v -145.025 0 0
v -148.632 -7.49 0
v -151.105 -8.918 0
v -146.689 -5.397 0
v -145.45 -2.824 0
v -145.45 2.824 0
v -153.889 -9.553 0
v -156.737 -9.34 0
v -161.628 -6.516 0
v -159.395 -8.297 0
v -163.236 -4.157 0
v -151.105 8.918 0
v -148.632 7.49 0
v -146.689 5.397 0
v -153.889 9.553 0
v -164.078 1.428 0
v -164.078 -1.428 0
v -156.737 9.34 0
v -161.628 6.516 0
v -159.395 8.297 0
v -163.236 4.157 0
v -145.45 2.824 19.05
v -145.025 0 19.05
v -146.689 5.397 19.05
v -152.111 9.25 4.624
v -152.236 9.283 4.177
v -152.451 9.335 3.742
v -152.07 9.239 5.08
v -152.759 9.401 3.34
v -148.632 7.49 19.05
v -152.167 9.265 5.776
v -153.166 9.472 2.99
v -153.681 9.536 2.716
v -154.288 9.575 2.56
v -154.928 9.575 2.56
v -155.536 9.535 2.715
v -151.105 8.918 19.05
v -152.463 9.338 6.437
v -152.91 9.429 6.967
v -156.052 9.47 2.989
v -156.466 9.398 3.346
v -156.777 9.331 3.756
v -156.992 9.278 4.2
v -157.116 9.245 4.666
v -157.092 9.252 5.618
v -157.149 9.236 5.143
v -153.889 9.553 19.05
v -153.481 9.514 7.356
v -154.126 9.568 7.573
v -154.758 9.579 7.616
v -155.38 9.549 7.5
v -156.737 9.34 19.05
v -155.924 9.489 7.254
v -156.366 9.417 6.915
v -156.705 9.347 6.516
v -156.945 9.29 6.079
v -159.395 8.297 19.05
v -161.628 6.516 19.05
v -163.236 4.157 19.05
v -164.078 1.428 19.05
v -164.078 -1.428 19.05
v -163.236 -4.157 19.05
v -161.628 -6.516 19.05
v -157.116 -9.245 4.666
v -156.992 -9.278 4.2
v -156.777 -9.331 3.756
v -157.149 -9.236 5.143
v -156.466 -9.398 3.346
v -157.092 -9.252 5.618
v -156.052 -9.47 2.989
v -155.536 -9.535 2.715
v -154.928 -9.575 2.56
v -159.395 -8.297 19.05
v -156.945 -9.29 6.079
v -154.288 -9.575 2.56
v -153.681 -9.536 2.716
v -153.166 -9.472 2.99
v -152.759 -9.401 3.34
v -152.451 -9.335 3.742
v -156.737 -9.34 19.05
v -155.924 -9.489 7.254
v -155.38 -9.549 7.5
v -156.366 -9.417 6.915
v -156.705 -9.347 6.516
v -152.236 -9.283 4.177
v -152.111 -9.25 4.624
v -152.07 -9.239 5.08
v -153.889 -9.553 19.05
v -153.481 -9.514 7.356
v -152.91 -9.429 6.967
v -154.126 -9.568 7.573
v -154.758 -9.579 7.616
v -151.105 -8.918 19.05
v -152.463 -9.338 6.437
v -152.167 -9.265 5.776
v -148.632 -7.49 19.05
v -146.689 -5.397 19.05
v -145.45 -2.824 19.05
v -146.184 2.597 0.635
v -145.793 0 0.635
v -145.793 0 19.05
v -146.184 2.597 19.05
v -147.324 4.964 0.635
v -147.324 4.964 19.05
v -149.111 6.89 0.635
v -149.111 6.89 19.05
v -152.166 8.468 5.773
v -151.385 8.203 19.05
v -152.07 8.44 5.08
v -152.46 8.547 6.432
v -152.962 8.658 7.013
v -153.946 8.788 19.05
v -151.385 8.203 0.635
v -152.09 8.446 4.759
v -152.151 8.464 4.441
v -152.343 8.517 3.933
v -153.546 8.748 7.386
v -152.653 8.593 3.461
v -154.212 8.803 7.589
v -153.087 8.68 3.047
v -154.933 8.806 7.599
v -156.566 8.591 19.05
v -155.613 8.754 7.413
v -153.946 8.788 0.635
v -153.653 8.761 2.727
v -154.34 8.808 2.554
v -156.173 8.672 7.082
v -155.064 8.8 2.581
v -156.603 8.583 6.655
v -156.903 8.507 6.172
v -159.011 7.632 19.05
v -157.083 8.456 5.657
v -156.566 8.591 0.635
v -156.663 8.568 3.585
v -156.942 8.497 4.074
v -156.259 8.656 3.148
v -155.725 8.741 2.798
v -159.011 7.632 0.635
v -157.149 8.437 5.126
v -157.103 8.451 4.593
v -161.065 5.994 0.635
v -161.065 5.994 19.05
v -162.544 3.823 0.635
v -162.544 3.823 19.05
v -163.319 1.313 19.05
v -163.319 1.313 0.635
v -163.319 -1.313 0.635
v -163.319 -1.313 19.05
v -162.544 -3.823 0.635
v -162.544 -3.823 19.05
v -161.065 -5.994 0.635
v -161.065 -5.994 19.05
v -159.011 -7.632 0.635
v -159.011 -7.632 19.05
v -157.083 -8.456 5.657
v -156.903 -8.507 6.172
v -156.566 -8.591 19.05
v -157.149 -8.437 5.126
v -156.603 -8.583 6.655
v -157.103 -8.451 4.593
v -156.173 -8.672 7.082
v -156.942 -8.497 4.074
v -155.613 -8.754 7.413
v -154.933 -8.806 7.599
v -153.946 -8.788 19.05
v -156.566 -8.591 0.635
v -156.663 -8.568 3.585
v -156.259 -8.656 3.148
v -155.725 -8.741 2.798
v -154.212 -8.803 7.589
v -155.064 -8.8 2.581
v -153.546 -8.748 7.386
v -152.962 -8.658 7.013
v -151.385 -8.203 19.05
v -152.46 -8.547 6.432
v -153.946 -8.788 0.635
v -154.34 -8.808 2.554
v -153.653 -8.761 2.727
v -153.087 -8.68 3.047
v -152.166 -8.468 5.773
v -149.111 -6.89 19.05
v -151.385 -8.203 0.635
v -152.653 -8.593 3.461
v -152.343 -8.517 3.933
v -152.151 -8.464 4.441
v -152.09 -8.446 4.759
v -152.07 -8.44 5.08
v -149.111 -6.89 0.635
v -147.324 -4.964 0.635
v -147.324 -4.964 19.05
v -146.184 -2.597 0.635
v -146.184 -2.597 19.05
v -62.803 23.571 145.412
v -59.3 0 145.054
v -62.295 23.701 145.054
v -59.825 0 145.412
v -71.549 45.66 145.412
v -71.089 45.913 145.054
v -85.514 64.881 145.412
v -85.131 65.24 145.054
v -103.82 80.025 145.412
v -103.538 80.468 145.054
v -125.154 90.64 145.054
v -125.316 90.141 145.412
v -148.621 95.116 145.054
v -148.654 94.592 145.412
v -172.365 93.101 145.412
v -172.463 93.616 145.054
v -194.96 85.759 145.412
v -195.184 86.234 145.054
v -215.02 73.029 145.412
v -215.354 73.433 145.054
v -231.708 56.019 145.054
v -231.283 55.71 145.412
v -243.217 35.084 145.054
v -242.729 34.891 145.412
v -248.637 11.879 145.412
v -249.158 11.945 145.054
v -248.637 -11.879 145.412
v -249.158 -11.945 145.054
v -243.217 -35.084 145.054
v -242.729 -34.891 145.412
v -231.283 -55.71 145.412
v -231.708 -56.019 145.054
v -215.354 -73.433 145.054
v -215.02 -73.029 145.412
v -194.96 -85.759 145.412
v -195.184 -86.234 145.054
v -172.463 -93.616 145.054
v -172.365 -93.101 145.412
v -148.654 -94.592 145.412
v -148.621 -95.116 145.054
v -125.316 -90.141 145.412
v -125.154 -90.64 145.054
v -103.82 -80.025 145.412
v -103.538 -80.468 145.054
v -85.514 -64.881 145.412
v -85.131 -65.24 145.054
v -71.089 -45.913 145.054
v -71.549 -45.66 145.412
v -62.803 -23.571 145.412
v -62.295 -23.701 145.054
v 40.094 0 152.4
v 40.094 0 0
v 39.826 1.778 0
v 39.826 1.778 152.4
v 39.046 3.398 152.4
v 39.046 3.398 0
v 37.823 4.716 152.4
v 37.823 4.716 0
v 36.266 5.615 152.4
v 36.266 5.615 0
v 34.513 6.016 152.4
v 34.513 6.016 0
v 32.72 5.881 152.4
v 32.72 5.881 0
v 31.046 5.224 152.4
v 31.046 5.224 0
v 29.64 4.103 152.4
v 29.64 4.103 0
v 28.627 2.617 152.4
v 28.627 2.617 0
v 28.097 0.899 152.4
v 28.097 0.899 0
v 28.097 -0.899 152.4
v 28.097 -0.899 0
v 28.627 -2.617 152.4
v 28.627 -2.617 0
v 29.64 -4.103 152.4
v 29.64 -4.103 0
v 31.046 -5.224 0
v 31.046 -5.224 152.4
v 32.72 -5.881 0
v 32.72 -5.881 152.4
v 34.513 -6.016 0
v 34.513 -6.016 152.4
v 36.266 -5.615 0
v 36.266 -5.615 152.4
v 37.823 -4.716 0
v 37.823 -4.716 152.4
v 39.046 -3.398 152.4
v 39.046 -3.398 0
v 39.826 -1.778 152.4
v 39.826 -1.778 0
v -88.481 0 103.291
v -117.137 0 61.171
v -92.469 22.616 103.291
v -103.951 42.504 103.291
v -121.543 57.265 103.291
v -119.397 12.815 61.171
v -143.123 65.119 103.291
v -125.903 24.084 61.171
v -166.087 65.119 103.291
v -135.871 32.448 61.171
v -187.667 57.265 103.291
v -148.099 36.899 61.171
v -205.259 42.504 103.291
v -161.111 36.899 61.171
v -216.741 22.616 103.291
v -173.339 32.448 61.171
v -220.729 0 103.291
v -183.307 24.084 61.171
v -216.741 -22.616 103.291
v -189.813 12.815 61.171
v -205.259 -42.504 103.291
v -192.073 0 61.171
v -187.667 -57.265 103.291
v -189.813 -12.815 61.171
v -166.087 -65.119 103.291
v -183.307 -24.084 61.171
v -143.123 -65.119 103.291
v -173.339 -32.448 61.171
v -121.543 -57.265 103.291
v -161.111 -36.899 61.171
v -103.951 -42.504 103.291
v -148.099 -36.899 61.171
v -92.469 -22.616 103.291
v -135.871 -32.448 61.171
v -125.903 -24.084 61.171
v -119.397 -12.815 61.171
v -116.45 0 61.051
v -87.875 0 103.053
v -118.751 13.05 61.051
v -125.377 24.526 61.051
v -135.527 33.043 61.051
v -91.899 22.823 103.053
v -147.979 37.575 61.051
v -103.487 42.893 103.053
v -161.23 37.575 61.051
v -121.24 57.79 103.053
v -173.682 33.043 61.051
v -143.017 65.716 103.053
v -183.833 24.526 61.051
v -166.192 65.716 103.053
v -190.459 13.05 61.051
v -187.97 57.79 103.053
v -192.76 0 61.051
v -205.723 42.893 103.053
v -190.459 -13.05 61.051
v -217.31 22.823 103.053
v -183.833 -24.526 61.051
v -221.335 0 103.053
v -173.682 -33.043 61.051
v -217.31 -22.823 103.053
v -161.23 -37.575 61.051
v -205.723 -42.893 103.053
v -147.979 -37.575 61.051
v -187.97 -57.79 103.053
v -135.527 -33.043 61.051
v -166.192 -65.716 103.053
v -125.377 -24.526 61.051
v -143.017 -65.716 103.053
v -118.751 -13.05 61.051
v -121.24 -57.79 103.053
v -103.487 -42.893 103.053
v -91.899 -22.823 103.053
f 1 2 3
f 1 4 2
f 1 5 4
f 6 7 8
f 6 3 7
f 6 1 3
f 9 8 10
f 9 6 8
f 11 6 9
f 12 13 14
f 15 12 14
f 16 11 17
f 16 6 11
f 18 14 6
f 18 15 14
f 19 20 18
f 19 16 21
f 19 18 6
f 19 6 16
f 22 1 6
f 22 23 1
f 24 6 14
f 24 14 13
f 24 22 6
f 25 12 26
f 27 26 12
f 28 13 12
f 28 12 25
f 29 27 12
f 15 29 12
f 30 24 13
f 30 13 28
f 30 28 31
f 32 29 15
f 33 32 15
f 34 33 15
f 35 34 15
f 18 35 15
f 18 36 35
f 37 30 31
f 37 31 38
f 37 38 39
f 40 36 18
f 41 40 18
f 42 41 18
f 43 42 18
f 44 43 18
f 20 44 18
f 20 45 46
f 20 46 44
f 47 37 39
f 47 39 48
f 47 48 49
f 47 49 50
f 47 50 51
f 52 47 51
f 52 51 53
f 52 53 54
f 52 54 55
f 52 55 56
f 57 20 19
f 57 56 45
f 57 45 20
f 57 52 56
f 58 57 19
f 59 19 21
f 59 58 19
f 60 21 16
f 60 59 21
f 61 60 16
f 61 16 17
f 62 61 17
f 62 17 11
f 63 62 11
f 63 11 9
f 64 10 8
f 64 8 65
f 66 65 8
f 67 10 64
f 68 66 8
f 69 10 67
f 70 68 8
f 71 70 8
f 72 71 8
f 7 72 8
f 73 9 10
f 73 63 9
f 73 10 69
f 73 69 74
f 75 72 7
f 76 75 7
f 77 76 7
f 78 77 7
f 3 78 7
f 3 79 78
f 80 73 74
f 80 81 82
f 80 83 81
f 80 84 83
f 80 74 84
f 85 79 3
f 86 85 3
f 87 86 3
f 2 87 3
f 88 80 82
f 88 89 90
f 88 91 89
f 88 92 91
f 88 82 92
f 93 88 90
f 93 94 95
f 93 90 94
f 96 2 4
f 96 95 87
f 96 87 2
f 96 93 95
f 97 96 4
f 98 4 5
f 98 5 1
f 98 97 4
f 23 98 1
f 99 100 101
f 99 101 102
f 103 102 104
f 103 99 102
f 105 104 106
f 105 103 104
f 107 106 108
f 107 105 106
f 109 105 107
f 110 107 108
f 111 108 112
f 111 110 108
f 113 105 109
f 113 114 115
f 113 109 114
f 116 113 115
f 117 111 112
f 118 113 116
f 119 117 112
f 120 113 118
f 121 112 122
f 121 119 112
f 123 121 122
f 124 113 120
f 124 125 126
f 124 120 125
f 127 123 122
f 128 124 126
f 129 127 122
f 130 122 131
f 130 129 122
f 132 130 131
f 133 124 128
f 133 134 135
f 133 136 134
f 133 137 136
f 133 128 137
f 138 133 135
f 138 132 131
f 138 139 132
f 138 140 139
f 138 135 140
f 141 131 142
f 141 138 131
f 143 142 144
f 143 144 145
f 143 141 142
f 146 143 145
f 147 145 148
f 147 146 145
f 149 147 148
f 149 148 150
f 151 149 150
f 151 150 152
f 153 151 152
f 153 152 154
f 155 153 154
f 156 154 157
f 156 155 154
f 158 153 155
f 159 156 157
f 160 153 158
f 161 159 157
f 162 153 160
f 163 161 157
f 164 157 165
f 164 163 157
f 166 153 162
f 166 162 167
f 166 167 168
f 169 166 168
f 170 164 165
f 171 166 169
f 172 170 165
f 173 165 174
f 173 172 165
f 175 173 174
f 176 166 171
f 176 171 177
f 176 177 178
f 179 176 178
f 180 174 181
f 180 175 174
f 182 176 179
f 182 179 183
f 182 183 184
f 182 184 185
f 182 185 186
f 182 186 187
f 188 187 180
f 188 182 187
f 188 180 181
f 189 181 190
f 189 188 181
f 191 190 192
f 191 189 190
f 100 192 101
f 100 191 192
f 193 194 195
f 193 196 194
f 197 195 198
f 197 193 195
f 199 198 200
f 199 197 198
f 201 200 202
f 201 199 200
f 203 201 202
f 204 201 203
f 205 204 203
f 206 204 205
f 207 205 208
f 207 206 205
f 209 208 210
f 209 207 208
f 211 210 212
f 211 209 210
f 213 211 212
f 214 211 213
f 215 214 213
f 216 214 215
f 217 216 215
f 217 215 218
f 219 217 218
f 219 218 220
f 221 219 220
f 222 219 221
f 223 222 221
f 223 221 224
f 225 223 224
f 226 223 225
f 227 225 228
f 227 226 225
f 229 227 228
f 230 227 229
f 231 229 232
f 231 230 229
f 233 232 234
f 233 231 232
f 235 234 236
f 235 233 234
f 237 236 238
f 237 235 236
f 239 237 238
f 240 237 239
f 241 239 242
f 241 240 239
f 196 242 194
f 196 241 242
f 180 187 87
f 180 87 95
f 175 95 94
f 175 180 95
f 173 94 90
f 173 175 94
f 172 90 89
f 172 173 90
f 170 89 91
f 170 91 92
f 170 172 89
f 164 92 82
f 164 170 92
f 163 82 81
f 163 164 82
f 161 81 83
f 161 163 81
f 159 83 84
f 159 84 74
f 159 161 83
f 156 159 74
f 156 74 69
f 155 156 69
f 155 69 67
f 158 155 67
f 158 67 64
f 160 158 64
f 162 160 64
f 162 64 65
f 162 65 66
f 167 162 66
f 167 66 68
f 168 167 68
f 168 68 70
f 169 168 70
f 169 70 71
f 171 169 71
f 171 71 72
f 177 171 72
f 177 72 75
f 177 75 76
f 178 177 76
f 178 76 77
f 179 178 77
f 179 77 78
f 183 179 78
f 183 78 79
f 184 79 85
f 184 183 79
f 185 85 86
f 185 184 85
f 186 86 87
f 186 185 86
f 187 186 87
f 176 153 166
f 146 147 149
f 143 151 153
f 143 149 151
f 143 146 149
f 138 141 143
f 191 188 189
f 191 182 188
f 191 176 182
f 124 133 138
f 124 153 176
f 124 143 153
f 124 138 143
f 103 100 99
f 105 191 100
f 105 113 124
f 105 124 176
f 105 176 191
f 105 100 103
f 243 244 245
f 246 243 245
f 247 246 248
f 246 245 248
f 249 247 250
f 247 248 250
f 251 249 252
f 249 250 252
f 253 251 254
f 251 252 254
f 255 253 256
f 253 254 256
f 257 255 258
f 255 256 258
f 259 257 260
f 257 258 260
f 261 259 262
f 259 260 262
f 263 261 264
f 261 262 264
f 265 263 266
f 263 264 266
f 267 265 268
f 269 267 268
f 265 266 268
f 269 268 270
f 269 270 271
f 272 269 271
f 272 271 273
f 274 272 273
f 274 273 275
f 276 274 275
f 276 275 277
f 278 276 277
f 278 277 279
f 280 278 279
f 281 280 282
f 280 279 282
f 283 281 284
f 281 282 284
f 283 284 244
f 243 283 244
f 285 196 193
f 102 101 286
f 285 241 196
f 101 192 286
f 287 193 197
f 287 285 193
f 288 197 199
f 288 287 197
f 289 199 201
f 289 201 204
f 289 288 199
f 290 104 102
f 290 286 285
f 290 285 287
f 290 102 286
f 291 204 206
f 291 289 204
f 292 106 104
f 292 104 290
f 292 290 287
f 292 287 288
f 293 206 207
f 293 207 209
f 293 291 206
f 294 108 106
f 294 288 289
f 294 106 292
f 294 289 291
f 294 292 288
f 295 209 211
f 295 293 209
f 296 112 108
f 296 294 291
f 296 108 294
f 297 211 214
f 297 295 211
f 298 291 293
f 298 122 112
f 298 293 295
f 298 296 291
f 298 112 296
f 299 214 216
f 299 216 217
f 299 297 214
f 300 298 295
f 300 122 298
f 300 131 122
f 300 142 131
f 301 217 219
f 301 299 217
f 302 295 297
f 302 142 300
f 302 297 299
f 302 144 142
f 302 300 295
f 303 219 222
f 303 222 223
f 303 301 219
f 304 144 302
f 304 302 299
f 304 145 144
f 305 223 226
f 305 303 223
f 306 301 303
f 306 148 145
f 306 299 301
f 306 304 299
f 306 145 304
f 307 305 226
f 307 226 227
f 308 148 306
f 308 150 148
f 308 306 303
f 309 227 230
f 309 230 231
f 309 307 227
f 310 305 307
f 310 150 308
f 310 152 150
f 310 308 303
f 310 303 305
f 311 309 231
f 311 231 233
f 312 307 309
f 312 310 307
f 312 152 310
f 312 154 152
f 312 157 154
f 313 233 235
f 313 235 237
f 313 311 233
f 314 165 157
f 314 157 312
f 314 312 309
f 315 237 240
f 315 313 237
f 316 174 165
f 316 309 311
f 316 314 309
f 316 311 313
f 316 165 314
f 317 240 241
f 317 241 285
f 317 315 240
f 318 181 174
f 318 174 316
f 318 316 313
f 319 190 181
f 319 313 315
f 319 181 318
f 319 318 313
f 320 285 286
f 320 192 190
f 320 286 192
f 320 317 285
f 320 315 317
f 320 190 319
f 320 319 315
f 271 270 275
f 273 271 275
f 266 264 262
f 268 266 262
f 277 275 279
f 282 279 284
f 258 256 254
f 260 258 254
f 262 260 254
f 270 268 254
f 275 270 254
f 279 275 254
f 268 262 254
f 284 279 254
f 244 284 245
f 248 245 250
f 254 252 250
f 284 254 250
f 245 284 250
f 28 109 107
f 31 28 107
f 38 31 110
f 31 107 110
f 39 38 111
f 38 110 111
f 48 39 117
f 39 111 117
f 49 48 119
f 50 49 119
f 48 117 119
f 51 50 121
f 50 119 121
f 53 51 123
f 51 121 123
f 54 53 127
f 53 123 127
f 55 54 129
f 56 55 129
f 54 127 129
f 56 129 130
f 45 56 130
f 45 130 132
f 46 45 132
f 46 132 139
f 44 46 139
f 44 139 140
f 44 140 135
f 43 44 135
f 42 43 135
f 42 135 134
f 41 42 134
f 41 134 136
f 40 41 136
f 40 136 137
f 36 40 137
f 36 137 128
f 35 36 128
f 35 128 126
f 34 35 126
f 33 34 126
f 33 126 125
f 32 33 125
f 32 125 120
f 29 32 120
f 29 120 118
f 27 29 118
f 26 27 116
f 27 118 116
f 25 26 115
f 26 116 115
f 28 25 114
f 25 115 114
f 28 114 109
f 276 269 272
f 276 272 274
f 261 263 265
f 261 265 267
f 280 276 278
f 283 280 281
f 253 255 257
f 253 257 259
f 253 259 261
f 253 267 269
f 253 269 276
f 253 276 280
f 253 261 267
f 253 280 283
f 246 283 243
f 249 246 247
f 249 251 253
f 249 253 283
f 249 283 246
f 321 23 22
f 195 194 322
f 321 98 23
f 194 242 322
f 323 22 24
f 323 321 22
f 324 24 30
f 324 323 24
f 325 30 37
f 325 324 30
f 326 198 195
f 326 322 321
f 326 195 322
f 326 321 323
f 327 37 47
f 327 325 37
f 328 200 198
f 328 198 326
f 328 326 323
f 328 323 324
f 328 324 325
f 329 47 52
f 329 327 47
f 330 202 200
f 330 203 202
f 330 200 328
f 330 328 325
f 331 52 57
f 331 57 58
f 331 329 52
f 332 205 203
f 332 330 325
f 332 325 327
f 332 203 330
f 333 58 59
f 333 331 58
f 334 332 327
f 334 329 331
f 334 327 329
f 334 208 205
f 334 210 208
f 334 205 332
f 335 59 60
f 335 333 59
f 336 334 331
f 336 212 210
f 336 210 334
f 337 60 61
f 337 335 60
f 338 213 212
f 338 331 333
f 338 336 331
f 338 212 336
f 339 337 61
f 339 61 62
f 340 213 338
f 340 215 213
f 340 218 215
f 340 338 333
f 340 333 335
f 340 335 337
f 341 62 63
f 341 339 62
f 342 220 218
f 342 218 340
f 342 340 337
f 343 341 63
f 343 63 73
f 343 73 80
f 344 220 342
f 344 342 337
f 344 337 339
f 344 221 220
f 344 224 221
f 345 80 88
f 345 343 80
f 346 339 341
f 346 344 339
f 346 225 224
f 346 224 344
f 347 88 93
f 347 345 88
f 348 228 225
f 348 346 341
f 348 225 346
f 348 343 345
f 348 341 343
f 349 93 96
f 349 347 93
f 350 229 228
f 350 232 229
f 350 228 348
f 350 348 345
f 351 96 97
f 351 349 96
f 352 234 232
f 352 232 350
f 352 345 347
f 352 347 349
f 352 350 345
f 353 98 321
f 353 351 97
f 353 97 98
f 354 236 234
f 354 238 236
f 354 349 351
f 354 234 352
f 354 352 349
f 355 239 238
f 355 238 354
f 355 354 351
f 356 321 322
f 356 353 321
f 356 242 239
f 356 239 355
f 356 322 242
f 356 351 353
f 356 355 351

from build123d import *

# Parameters (mm, degrees)
F0_R           = 6.35
F1_DEPTH       = 0.635
F2_R           = 6.35
F2_R_2         = 5.715
F3_DEPTH       = 12.7
F4_R           = 2.2225
F5_DEPTH       = 6.351
F5_DEPTH_BACK  = 6.351
F6_R           = 6.0325
F7_DEPTH       = 152.4
F12_R          = 2.54
F13_DEPTH      = 95.3055038166
F13_DEPTH_BACK = 95.3055038166
F9_R           = 9.580209983
F14_DEPTH      = 0.635


with BuildPart() as f1:
    # F0 (on Top) → F1 (new body)
    with BuildSketch(Plane.XY):
        Circle(F0_R)
    extrude(amount=F1_DEPTH)

    # F2 (on face) → F3 (join)
    with BuildSketch(Plane.XY.offset(0.635)):
        Circle(F2_R)
        Circle(F2_R_2, mode=Mode.SUBTRACT)
    extrude(amount=F3_DEPTH)

    # F4 (on Front) → F5 (cut, two sides)
    with BuildSketch(Plane.XZ) as f5_sk:
        with Locations((0, 3.175)):
            Circle(F4_R)
    extrude(amount=-F5_DEPTH, mode=Mode.SUBTRACT)
    extrude(f5_sk.sketch, amount=F5_DEPTH_BACK, mode=Mode.SUBTRACT)


with BuildPart() as f7:
    # F6 (on Top) → F7 (new body)
    with BuildSketch(Plane.XY):
        with Locations((34.0619625497, 0)):
            Circle(F6_R)
    extrude(amount=F7_DEPTH)


with BuildPart() as f10:
    # F8 (on Front) → F10 (revolve)
    with BuildSketch(Plane.XZ):
        Polygon((-145.792722702, 19.05), (-145.792722702, 0), (-145.0247018212, 0), (-145.0247018212, 19.05), (-59.3004079876, 145.054386617), (-59.8254262651, 145.4115711746), align=None)
    revolve(axis=Axis((-154.6049118042, 0, 0), (0, 0, 1)))

    # F12 (on Front) → F13 (cut, two sides)
    with BuildSketch(Plane.XZ) as f13_sk:
        with Locations((-154.6098, 5.08)):
            Circle(F12_R)
    extrude(amount=-F13_DEPTH, mode=Mode.SUBTRACT)
    extrude(f13_sk.sketch, amount=F13_DEPTH_BACK, mode=Mode.SUBTRACT)

    # F9 (on Top) → F14 (join)
    with BuildSketch(Plane.XY):
        with Locations((-154.6049118042, 0)):
            Circle(F9_R)
    extrude(amount=F14_DEPTH)


solid = Compound([f7.part, f10.part])
